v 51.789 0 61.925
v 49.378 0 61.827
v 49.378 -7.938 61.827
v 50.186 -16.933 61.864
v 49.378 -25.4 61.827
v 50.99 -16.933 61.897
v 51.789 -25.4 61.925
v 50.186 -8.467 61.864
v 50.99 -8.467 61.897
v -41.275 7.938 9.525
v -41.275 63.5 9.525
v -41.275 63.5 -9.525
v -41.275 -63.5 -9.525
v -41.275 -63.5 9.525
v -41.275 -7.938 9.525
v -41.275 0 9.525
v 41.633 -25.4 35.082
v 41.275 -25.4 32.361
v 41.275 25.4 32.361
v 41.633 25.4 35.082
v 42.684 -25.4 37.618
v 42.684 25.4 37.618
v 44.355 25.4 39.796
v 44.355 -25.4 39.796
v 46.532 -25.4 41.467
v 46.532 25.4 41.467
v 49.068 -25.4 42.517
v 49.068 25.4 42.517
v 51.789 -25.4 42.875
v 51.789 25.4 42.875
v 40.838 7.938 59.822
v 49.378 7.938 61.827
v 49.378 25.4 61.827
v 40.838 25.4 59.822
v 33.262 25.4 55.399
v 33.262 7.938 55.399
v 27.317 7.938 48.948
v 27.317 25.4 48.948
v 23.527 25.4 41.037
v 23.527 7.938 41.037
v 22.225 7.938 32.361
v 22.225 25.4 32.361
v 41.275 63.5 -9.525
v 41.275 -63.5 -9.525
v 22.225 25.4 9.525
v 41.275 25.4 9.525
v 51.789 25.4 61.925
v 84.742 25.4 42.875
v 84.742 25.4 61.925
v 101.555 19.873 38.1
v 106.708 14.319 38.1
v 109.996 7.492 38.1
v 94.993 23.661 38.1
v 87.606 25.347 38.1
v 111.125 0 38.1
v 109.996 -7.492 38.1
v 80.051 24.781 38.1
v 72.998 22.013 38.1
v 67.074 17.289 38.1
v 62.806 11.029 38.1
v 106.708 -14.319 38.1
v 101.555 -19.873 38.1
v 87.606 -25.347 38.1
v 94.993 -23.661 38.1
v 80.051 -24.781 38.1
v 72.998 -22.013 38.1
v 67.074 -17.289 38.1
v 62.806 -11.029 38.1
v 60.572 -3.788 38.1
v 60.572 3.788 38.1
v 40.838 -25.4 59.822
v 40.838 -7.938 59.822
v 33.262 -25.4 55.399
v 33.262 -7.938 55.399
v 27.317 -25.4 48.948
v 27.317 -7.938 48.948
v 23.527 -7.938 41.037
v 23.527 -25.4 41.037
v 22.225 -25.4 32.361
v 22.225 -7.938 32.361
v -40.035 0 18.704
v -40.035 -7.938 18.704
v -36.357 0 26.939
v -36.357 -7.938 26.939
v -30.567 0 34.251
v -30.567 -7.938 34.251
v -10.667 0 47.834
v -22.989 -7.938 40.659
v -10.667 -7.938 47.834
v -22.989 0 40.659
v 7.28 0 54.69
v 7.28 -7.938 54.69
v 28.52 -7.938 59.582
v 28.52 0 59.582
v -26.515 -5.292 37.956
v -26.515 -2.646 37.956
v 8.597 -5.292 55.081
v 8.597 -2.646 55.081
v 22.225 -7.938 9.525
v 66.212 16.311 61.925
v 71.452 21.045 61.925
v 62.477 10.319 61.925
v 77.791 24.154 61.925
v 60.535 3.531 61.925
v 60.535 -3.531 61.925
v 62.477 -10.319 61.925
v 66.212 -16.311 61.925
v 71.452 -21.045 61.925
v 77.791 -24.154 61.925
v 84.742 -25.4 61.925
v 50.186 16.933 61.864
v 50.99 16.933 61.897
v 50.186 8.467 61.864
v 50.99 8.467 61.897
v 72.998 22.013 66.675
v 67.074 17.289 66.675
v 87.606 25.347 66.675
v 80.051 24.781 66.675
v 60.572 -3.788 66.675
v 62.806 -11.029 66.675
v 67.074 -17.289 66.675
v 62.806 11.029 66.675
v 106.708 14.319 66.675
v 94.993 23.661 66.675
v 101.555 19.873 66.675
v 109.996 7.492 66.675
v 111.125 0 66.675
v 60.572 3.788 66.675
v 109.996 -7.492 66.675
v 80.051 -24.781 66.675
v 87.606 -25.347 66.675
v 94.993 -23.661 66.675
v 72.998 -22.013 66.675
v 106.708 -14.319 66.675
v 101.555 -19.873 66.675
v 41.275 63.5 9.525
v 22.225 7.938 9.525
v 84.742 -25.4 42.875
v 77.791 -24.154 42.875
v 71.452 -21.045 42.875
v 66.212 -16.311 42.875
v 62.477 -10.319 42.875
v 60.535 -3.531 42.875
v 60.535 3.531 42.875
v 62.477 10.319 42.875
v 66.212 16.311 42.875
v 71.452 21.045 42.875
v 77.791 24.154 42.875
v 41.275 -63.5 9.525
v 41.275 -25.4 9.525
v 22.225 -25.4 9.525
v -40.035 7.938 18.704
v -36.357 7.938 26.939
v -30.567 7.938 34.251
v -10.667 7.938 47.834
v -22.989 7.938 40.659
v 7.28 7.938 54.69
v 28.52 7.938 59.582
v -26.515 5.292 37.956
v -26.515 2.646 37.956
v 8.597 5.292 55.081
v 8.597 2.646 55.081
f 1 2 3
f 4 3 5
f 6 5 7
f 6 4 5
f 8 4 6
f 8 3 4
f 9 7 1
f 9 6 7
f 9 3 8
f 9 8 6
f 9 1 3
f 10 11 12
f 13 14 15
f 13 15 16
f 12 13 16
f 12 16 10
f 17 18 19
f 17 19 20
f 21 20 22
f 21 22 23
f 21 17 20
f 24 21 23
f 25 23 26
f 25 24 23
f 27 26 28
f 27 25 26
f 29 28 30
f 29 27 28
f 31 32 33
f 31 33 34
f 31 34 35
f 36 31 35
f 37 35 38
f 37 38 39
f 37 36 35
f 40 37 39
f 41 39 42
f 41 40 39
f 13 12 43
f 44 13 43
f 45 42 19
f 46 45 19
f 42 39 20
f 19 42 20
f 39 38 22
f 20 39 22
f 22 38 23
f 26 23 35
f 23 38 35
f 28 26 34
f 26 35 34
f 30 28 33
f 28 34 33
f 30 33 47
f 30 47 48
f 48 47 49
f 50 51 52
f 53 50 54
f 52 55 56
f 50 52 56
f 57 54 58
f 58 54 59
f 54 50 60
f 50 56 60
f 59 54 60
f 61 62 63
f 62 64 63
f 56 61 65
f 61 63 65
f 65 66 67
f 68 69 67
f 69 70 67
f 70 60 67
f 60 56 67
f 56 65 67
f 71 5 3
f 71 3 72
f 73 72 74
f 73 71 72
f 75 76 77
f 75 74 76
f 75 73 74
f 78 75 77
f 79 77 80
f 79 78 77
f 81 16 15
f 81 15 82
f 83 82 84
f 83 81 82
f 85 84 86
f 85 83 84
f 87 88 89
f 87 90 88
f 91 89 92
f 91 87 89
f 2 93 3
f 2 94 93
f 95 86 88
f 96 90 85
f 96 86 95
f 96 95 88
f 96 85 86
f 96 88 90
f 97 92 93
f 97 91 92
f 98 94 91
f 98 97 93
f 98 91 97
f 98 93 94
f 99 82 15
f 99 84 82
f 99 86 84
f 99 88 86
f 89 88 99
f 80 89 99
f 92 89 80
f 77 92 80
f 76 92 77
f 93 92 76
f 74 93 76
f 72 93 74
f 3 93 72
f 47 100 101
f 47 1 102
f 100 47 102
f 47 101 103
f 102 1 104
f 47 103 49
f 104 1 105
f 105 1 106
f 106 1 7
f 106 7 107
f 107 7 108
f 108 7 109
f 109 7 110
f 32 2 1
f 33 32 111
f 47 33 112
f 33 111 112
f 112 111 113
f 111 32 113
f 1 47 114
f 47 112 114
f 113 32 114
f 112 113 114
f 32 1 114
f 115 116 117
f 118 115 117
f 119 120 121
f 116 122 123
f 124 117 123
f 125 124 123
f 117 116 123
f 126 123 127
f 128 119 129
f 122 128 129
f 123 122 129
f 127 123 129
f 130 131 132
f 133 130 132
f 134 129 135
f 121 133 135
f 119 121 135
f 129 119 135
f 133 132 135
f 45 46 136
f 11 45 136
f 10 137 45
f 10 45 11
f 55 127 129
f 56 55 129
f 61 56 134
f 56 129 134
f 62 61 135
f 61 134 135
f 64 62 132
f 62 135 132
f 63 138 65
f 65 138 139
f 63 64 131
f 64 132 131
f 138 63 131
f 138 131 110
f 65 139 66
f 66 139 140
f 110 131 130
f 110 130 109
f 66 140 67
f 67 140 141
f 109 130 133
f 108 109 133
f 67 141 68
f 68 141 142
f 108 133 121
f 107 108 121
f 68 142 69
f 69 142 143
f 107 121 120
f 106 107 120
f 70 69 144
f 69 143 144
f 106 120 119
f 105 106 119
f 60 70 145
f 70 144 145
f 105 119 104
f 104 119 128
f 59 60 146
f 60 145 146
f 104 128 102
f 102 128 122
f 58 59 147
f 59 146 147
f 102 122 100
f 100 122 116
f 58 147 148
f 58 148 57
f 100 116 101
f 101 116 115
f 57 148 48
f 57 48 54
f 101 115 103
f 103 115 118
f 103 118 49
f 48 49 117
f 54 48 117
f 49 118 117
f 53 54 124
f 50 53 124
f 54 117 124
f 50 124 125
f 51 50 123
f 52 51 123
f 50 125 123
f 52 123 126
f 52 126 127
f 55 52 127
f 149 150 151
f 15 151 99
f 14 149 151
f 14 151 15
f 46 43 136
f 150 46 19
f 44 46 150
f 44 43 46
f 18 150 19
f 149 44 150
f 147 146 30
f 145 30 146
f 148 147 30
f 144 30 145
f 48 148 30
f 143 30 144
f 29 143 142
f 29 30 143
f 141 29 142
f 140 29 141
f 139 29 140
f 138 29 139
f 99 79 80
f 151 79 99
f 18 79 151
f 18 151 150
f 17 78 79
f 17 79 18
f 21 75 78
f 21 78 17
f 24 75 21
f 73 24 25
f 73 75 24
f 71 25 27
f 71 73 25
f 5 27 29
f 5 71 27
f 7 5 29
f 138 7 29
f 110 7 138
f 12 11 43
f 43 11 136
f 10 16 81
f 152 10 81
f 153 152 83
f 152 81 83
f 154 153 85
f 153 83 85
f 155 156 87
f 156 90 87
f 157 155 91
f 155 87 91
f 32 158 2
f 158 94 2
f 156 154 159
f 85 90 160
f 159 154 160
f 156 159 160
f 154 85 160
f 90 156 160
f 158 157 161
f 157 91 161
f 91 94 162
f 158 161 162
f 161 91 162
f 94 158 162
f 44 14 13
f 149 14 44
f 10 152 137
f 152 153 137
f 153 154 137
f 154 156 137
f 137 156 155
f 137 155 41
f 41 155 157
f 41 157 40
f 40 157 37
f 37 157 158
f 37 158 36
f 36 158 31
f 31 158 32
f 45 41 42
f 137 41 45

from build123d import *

# Parameters (mm, degrees)
F1_DEPTH = 63.5
F2_DEPTH = 25.4
F0_W     = 25.3816735625
F0_H     = 19.05
F3_DEPTH = 25.4
F5_DEPTH = 7.9375


with BuildPart() as f1:
    # F0 (on Front) → F1 (new body, symmetric)
    with BuildSketch(Plane.XZ):
        Polygon((41.275, -9.525), (41.275, 9.525), (22.225, 9.525), (-41.275, 9.525), (-41.275, -9.525), align=None)
    extrude(amount=F1_DEPTH, both=True)

    # F0 (on Front) → F2 (join, symmetric)
    with BuildSketch(Plane.XZ):
        with BuildLine():
            Line((22.225, 9.525), (41.275, 9.525))
            Line((41.275, 9.525), (41.275, 32.3611232806))
            ThreePointArc((41.275, 32.3611232806), (44.3545017732, 39.7956982268), (51.7890767194, 42.8752))
            Line((51.7890767194, 42.8752), (60.325, 42.8752))
            Line((60.325, 42.8752), (60.325, 61.9252))
            Line((60.325, 61.9252), (51.7890767194, 61.9252))
            add(Edge.make_bspline(
                [(49.378379009, 61.8267501842), (50.188059931, 61.8657540614), (50.9918272392, 61.8985579588), (51.7890767194, 61.9252)],
                knots=[104.6145771786, 104.6145771786, 104.6145771786, 104.6145771786, 106.8021691525, 106.8021691525, 106.8021691525, 106.8021691525], degree=3))
            ThreePointArc((49.378379009, 61.8267501842), (30.0485076798, 52.3956507296), (22.225, 32.3611232806))
            Line((22.225, 32.3611232806), (22.225, 9.525))
        make_face()
    extrude(amount=F2_DEPTH, both=True)

    # F0 (on Front) → F3 (join, symmetric)
    with BuildSketch(Plane.XZ):
        with Locations((73.0158367813, 52.4002)):
            Rectangle(F0_W, F0_H)
    extrude(amount=F3_DEPTH, both=True)

    # F0 (on Front) → F4 (revolve)
    with BuildSketch(Plane.XZ):
        Polygon((85.7066735625, 61.9252), (85.7066735625, 42.8752), (85.7066735625, 38.1), (111.125, 38.1), (111.125, 66.675), (85.7066735625, 66.675), align=None)
    revolve(axis=Axis((85.7066735625, 0, 52.3875), (0, 0, -1)))

    # F0 (on Front) → F5 (join, symmetric)
    with BuildSketch(Plane.XZ):
        with BuildLine():
            Line((-41.275, 9.525), (22.225, 9.525))
            Line((22.225, 9.525), (22.225, 32.3611232806))
            ThreePointArc((22.225, 32.3611232806), (30.0485076798, 52.3956507296), (49.378379009, 61.8267501842))
            add(Edge.make_bspline(
                [(-41.275, 9.525), (-41.5863992268, 43.9173953964), (10.6579831052, 59.9615147216), (49.378379009, 61.8267501842)],
                knots=[0, 0, 0, 0, 104.6145771786, 104.6145771786, 104.6145771786, 104.6145771786], degree=3))
        make_face()
    extrude(amount=F5_DEPTH, both=True)


solid = f1.part
